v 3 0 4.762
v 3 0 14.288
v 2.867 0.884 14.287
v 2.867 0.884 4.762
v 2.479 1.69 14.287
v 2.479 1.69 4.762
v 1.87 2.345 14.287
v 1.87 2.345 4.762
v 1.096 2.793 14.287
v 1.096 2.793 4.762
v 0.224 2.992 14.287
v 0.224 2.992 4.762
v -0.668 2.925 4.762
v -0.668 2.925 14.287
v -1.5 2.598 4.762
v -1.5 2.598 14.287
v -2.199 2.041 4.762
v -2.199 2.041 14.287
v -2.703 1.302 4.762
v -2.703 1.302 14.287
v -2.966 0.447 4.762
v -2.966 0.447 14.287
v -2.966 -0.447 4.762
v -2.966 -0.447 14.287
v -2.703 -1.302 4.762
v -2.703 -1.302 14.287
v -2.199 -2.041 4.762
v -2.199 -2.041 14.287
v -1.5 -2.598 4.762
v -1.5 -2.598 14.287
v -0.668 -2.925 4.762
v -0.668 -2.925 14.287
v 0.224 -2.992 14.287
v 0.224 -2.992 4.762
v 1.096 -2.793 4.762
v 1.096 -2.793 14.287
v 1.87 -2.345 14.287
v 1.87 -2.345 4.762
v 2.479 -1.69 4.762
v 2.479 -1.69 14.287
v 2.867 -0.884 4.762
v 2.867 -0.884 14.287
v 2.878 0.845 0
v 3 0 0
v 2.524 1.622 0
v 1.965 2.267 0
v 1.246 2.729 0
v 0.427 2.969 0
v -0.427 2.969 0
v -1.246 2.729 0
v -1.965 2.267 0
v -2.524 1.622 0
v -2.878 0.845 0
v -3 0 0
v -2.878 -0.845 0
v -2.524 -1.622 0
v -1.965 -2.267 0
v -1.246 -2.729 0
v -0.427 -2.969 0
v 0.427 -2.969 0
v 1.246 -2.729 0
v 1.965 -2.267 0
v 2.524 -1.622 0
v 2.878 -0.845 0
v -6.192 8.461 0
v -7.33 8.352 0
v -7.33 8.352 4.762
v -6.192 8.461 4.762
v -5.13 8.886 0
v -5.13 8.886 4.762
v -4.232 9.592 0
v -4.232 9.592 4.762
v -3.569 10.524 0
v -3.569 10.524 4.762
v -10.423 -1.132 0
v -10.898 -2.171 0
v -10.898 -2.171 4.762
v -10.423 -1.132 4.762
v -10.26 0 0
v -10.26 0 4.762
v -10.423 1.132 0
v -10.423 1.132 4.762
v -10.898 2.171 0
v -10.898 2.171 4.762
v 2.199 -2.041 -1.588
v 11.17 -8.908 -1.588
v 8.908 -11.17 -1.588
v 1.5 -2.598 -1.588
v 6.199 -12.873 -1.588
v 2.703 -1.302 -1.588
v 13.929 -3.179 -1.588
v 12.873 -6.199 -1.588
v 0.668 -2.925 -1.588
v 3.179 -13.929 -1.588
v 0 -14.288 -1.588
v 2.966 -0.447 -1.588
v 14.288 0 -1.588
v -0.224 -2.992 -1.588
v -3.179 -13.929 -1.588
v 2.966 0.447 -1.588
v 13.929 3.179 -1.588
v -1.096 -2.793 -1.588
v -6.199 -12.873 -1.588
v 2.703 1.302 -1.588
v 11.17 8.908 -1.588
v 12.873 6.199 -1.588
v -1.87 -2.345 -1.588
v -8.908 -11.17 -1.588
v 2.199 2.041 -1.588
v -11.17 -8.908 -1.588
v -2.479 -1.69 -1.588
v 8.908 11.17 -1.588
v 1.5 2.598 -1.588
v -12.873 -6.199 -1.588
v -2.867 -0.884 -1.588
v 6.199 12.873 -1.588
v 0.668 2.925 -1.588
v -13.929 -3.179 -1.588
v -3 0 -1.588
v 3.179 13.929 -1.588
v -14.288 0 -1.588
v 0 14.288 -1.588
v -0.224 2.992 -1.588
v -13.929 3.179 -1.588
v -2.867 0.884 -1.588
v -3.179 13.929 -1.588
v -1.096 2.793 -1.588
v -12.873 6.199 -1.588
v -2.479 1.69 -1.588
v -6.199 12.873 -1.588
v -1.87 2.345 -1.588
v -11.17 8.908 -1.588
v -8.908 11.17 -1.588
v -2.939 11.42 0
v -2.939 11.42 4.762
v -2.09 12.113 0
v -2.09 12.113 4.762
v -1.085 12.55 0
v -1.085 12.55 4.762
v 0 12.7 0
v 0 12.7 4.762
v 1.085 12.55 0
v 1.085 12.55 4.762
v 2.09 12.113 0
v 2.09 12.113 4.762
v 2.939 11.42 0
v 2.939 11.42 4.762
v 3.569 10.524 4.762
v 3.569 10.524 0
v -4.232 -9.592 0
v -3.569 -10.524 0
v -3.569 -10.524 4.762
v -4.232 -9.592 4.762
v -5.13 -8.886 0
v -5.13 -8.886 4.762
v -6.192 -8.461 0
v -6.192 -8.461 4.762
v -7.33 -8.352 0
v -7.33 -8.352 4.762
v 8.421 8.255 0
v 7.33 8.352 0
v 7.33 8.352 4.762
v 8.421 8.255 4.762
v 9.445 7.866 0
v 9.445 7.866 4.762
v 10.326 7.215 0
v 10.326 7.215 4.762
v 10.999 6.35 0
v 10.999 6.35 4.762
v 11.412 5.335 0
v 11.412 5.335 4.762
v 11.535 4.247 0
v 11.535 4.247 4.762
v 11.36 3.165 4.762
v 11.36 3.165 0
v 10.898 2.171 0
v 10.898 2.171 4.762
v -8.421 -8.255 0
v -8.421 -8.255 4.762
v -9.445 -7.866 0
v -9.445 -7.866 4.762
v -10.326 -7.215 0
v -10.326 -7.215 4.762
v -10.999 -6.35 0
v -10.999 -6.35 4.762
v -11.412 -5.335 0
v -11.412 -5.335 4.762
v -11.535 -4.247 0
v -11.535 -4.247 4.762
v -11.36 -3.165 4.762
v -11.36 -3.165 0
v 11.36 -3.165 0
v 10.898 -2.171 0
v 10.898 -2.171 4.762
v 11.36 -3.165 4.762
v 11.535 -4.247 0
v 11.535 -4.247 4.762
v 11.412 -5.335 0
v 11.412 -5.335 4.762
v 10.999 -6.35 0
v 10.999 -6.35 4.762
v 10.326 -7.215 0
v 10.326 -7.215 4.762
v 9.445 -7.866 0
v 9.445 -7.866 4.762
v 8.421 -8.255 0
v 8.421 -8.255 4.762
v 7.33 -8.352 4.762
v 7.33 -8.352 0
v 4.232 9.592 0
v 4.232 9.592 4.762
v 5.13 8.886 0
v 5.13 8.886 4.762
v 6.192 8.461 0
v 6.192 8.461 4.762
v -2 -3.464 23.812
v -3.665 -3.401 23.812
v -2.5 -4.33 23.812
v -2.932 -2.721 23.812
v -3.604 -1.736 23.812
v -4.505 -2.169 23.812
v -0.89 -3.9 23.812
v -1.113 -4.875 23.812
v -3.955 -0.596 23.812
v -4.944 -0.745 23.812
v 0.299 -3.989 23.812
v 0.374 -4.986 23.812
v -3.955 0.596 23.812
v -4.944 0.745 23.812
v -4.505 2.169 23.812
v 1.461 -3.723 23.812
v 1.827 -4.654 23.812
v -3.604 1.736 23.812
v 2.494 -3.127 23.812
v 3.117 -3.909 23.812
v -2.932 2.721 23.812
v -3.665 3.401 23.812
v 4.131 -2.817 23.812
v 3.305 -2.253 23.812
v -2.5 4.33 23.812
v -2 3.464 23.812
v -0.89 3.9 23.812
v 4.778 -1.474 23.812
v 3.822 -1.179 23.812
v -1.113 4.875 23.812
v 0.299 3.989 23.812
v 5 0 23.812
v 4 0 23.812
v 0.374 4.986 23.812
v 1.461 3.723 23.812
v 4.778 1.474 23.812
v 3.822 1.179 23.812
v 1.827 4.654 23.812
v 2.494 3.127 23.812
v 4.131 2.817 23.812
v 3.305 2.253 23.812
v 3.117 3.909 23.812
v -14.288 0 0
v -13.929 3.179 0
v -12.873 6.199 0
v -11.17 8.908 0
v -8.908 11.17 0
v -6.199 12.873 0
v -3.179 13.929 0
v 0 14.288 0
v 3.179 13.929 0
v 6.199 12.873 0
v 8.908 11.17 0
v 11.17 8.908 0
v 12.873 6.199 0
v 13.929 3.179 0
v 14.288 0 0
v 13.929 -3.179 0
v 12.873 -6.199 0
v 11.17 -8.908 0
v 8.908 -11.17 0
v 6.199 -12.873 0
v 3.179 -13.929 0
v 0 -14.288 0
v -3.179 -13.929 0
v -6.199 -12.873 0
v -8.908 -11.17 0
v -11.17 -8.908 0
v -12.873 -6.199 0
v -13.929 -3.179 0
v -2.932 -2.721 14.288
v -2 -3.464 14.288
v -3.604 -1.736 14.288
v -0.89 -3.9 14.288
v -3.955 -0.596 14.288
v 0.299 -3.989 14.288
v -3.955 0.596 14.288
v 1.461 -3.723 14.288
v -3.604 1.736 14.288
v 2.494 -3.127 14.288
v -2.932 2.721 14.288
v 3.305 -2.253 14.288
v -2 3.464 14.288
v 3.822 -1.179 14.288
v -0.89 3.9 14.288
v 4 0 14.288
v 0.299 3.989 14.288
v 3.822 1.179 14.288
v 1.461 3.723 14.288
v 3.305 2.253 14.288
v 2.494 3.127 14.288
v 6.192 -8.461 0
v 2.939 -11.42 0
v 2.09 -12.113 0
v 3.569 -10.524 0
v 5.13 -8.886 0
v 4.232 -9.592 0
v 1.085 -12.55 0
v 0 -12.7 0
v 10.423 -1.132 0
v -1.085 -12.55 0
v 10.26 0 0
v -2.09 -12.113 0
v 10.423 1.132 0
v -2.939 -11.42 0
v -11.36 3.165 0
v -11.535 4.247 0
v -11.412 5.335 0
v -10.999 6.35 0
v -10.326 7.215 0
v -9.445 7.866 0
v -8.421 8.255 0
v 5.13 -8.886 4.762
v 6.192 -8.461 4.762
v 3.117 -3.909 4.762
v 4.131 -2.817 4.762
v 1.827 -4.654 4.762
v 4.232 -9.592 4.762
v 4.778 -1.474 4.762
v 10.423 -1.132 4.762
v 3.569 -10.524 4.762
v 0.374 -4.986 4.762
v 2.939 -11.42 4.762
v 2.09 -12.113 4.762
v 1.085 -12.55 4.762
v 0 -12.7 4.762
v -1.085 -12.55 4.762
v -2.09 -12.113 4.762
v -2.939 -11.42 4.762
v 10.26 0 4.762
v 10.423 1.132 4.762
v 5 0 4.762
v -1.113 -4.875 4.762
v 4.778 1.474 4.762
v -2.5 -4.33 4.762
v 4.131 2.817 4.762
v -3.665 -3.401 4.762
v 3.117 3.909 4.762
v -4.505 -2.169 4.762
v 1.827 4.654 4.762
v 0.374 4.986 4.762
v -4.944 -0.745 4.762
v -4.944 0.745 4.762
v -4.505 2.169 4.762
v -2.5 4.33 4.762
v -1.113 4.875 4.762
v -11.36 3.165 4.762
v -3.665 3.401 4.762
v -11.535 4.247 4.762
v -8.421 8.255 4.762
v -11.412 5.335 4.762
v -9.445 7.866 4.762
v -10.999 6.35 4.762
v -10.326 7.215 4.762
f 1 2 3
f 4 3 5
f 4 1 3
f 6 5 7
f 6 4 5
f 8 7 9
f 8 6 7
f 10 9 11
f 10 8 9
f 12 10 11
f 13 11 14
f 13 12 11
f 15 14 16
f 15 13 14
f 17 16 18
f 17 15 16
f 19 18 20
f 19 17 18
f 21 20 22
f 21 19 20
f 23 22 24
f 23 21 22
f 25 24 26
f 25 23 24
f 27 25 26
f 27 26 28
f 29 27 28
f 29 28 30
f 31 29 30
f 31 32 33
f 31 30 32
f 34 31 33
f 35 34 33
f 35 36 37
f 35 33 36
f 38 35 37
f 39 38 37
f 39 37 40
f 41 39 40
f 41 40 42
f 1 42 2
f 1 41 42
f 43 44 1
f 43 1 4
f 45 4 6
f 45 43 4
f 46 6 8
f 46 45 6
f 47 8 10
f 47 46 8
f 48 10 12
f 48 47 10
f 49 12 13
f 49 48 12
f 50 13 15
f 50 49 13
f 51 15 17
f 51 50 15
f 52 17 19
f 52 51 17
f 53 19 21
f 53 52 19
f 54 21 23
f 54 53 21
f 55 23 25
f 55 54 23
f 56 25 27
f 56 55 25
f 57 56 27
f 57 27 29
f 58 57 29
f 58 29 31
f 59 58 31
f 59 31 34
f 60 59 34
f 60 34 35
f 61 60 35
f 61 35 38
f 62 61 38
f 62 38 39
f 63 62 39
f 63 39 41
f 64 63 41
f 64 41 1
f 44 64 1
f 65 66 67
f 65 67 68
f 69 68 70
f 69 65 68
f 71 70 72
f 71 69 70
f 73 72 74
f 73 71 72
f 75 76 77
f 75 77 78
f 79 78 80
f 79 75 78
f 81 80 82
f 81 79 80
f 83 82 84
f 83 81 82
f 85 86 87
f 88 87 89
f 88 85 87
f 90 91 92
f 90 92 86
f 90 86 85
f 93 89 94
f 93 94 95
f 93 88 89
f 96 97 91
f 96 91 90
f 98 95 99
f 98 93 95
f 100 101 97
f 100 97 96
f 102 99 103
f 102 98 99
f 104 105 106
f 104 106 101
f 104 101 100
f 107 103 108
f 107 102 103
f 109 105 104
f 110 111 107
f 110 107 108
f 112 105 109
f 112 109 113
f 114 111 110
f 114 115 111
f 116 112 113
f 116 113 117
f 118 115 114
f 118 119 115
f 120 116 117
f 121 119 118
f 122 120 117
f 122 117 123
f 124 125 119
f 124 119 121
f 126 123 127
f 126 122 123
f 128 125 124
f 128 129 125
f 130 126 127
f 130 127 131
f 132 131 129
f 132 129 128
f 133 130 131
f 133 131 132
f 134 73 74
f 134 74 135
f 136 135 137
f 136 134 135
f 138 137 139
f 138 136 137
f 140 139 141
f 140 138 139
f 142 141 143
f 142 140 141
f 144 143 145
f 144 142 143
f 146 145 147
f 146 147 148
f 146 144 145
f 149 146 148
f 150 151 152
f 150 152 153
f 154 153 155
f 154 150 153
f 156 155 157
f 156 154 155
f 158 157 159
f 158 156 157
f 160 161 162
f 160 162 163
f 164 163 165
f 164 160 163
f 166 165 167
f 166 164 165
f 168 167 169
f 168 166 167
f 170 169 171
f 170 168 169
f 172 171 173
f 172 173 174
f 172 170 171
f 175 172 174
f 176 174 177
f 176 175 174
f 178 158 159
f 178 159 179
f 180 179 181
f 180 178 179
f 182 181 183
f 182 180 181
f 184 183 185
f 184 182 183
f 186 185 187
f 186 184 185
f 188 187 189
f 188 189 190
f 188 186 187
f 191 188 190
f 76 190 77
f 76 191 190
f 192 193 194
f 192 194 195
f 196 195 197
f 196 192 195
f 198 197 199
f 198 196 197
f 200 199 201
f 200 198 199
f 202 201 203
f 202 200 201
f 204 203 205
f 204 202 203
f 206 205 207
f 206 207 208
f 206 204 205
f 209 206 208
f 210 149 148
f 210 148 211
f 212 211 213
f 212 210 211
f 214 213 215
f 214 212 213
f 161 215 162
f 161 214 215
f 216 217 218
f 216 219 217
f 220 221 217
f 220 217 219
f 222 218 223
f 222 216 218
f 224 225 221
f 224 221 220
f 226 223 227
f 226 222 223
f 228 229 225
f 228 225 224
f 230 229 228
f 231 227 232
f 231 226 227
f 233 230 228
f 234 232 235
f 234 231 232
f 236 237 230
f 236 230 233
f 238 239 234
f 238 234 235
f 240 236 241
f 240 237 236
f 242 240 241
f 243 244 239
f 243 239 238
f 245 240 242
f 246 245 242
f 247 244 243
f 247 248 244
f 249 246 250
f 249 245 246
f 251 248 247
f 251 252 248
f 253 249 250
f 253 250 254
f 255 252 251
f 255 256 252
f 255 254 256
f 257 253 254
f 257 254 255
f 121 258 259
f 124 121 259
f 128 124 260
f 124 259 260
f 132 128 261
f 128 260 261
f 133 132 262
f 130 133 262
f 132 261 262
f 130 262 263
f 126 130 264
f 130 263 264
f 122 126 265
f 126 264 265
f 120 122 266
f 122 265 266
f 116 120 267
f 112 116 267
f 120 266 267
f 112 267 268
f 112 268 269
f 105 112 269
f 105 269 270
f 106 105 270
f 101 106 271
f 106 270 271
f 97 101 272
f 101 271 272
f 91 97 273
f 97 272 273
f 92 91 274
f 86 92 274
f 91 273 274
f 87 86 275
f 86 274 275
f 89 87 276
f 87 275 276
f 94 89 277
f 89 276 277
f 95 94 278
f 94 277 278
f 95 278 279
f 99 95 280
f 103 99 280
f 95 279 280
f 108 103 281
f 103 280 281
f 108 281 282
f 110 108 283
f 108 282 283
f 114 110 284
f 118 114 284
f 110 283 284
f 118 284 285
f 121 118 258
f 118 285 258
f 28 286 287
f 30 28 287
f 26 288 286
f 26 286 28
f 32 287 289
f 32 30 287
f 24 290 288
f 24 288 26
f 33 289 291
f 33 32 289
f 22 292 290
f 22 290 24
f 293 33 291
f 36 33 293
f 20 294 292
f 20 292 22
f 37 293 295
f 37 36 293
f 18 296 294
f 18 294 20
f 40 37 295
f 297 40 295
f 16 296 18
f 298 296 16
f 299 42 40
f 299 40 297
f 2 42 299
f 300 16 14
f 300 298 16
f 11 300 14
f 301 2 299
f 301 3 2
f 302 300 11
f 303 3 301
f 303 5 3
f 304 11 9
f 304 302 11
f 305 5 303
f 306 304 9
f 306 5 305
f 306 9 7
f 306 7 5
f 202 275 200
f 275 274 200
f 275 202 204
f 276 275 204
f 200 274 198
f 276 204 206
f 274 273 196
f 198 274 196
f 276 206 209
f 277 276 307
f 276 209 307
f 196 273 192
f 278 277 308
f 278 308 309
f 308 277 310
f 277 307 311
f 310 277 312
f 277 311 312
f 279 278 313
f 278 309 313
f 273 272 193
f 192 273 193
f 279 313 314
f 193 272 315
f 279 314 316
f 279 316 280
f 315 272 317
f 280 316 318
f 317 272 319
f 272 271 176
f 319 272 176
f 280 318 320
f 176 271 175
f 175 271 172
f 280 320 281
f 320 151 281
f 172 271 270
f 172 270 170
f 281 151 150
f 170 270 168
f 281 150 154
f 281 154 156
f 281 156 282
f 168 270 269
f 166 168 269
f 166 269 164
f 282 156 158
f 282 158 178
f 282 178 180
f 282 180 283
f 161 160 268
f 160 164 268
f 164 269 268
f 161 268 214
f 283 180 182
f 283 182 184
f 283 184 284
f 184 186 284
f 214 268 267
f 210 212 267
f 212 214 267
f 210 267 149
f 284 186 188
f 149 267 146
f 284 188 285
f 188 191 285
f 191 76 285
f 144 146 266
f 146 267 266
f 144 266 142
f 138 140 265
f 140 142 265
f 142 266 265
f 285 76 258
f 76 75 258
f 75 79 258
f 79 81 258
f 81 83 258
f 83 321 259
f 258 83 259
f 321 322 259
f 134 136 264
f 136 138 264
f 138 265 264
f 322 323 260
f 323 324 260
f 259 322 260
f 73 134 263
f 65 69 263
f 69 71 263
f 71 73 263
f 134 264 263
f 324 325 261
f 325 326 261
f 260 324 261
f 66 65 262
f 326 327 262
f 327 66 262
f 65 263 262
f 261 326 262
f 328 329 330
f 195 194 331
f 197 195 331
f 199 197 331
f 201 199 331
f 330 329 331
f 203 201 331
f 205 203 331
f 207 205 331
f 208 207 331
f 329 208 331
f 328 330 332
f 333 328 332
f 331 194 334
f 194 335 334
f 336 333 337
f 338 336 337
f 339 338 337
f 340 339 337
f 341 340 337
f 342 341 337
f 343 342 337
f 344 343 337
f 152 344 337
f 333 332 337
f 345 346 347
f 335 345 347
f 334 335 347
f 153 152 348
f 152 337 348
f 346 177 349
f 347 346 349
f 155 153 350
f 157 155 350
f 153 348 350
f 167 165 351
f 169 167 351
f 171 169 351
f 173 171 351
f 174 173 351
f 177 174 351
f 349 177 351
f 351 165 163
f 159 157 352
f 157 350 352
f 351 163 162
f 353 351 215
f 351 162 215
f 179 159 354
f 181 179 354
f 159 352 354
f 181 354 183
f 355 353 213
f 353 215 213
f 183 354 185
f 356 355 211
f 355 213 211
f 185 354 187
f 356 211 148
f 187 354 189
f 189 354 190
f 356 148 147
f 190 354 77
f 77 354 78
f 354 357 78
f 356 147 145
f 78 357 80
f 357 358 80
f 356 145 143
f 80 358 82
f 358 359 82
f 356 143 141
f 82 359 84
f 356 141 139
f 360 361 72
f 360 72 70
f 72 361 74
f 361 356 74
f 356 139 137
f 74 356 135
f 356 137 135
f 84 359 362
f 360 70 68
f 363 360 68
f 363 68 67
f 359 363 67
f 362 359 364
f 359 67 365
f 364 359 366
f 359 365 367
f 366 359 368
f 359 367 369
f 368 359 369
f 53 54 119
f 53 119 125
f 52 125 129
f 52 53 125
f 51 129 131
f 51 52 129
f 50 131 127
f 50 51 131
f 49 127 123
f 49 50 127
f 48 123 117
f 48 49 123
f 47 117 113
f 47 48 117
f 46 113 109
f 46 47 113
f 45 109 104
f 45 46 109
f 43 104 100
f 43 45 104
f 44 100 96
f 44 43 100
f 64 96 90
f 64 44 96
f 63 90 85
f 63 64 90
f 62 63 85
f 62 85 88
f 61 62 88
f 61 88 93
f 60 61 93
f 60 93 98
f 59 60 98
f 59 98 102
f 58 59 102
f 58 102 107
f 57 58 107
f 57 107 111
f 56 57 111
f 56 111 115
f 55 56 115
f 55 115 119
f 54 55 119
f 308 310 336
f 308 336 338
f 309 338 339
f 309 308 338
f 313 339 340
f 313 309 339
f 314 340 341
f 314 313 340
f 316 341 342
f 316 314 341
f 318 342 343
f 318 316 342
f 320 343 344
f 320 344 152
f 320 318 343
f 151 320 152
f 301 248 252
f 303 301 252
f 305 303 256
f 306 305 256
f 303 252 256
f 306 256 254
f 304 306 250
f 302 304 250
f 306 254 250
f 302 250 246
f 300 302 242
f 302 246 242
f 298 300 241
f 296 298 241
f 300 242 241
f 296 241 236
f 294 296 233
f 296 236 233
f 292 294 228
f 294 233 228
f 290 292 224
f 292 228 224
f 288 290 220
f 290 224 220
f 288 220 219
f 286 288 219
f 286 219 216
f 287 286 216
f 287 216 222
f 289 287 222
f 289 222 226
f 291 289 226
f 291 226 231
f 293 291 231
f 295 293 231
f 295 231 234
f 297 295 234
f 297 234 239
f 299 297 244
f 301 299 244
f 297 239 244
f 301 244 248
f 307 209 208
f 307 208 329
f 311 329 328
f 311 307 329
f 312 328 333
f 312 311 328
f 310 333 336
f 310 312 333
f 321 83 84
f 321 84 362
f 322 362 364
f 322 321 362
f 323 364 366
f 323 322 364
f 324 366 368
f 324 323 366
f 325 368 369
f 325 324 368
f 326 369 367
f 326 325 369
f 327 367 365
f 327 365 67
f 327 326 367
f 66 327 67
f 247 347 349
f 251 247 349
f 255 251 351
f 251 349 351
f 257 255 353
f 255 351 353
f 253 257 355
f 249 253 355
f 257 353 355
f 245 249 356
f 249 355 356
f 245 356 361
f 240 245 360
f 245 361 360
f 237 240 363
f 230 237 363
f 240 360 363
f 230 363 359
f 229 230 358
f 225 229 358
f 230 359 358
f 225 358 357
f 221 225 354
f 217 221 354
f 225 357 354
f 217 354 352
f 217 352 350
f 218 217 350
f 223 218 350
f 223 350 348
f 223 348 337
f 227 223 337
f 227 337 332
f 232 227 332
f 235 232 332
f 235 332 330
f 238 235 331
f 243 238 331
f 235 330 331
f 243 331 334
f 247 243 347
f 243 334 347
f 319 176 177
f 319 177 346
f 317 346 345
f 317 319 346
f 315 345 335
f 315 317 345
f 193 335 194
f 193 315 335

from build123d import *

# Parameters (mm, degrees)
SKETCH1_R           = 3
BOSS_EXTRUDE1_DEPTH = 4.7625
SKETCH2_R           = 14.2875
SKETCH2_R_2         = 3
BOSS_EXTRUDE2_DEPTH = 1.5875
SKETCH3_R           = 5
SKETCH3_R_2         = 3
BOSS_EXTRUDE3_DEPTH = 19.05
SKETCH4_R           = 4
CUT_EXTRUDE1_DEPTH  = 9.525


with BuildPart() as part:
    # Sketch1 → Boss-Extrude1 (new body)
    with BuildSketch(Plane.XY):
        with BuildLine():
            ThreePointArc((-3.568592622, 10.523915761), (0, 12.7), (3.568592622, 10.523915761))
            ThreePointArc((3.568592622, 10.523915761), (5.130117272, 8.885623765), (7.329682086, 8.352449747))
            ThreePointArc((7.329682086, 8.352449747), (10.998522628, 6.35), (10.898274707, 2.171466014))
            ThreePointArc((10.898274707, 2.171466014), (10.260234545, 0), (10.898274707, -2.171466014))
            ThreePointArc((10.898274707, -2.171466014), (10.998522628, -6.35), (7.329682086, -8.352449747))
            ThreePointArc((7.329682086, -8.352449747), (5.130117272, -8.885623765), (3.568592622, -10.523915761))
            ThreePointArc((3.568592622, -10.523915761), (0, -12.7), (-3.568592622, -10.523915761))
            ThreePointArc((-3.568592622, -10.523915761), (-5.130117272, -8.885623765), (-7.329682086, -8.352449747))
            ThreePointArc((-7.329682086, -8.352449747), (-10.998522628, -6.35), (-10.898274707, -2.171466014))
            ThreePointArc((-10.898274707, -2.171466014), (-10.260234545, 0), (-10.898274707, 2.171466014))
            ThreePointArc((-10.898274707, 2.171466014), (-10.998522628, 6.35), (-7.329682086, 8.352449747))
            ThreePointArc((-7.329682086, 8.352449747), (-5.130117272, 8.885623765), (-3.568592622, 10.523915761))
        make_face()
        Circle(SKETCH1_R, mode=Mode.SUBTRACT)
    extrude(amount=BOSS_EXTRUDE1_DEPTH)

    # Sketch2 → Boss-Extrude2 (add)
    with BuildSketch(Plane(origin=(0, 0, 0), x_dir=(-1, 0, 0), z_dir=(0, 0, -1))):
        Circle(SKETCH2_R)
        Circle(SKETCH2_R_2, mode=Mode.SUBTRACT)
    extrude(amount=BOSS_EXTRUDE2_DEPTH)

    # Sketch3 → Boss-Extrude3 (add)
    with BuildSketch(Plane.XY.offset(4.7625)):
        Circle(SKETCH3_R)
        Circle(SKETCH3_R_2, mode=Mode.SUBTRACT)
    extrude(amount=BOSS_EXTRUDE3_DEPTH)

    # Sketch4 → Cut-Extrude1 (cut)
    with BuildSketch(Plane.XY.offset(23.8125)):
        Circle(SKETCH4_R)
    extrude(amount=-CUT_EXTRUDE1_DEPTH, mode=Mode.SUBTRACT)


solid = part.part
